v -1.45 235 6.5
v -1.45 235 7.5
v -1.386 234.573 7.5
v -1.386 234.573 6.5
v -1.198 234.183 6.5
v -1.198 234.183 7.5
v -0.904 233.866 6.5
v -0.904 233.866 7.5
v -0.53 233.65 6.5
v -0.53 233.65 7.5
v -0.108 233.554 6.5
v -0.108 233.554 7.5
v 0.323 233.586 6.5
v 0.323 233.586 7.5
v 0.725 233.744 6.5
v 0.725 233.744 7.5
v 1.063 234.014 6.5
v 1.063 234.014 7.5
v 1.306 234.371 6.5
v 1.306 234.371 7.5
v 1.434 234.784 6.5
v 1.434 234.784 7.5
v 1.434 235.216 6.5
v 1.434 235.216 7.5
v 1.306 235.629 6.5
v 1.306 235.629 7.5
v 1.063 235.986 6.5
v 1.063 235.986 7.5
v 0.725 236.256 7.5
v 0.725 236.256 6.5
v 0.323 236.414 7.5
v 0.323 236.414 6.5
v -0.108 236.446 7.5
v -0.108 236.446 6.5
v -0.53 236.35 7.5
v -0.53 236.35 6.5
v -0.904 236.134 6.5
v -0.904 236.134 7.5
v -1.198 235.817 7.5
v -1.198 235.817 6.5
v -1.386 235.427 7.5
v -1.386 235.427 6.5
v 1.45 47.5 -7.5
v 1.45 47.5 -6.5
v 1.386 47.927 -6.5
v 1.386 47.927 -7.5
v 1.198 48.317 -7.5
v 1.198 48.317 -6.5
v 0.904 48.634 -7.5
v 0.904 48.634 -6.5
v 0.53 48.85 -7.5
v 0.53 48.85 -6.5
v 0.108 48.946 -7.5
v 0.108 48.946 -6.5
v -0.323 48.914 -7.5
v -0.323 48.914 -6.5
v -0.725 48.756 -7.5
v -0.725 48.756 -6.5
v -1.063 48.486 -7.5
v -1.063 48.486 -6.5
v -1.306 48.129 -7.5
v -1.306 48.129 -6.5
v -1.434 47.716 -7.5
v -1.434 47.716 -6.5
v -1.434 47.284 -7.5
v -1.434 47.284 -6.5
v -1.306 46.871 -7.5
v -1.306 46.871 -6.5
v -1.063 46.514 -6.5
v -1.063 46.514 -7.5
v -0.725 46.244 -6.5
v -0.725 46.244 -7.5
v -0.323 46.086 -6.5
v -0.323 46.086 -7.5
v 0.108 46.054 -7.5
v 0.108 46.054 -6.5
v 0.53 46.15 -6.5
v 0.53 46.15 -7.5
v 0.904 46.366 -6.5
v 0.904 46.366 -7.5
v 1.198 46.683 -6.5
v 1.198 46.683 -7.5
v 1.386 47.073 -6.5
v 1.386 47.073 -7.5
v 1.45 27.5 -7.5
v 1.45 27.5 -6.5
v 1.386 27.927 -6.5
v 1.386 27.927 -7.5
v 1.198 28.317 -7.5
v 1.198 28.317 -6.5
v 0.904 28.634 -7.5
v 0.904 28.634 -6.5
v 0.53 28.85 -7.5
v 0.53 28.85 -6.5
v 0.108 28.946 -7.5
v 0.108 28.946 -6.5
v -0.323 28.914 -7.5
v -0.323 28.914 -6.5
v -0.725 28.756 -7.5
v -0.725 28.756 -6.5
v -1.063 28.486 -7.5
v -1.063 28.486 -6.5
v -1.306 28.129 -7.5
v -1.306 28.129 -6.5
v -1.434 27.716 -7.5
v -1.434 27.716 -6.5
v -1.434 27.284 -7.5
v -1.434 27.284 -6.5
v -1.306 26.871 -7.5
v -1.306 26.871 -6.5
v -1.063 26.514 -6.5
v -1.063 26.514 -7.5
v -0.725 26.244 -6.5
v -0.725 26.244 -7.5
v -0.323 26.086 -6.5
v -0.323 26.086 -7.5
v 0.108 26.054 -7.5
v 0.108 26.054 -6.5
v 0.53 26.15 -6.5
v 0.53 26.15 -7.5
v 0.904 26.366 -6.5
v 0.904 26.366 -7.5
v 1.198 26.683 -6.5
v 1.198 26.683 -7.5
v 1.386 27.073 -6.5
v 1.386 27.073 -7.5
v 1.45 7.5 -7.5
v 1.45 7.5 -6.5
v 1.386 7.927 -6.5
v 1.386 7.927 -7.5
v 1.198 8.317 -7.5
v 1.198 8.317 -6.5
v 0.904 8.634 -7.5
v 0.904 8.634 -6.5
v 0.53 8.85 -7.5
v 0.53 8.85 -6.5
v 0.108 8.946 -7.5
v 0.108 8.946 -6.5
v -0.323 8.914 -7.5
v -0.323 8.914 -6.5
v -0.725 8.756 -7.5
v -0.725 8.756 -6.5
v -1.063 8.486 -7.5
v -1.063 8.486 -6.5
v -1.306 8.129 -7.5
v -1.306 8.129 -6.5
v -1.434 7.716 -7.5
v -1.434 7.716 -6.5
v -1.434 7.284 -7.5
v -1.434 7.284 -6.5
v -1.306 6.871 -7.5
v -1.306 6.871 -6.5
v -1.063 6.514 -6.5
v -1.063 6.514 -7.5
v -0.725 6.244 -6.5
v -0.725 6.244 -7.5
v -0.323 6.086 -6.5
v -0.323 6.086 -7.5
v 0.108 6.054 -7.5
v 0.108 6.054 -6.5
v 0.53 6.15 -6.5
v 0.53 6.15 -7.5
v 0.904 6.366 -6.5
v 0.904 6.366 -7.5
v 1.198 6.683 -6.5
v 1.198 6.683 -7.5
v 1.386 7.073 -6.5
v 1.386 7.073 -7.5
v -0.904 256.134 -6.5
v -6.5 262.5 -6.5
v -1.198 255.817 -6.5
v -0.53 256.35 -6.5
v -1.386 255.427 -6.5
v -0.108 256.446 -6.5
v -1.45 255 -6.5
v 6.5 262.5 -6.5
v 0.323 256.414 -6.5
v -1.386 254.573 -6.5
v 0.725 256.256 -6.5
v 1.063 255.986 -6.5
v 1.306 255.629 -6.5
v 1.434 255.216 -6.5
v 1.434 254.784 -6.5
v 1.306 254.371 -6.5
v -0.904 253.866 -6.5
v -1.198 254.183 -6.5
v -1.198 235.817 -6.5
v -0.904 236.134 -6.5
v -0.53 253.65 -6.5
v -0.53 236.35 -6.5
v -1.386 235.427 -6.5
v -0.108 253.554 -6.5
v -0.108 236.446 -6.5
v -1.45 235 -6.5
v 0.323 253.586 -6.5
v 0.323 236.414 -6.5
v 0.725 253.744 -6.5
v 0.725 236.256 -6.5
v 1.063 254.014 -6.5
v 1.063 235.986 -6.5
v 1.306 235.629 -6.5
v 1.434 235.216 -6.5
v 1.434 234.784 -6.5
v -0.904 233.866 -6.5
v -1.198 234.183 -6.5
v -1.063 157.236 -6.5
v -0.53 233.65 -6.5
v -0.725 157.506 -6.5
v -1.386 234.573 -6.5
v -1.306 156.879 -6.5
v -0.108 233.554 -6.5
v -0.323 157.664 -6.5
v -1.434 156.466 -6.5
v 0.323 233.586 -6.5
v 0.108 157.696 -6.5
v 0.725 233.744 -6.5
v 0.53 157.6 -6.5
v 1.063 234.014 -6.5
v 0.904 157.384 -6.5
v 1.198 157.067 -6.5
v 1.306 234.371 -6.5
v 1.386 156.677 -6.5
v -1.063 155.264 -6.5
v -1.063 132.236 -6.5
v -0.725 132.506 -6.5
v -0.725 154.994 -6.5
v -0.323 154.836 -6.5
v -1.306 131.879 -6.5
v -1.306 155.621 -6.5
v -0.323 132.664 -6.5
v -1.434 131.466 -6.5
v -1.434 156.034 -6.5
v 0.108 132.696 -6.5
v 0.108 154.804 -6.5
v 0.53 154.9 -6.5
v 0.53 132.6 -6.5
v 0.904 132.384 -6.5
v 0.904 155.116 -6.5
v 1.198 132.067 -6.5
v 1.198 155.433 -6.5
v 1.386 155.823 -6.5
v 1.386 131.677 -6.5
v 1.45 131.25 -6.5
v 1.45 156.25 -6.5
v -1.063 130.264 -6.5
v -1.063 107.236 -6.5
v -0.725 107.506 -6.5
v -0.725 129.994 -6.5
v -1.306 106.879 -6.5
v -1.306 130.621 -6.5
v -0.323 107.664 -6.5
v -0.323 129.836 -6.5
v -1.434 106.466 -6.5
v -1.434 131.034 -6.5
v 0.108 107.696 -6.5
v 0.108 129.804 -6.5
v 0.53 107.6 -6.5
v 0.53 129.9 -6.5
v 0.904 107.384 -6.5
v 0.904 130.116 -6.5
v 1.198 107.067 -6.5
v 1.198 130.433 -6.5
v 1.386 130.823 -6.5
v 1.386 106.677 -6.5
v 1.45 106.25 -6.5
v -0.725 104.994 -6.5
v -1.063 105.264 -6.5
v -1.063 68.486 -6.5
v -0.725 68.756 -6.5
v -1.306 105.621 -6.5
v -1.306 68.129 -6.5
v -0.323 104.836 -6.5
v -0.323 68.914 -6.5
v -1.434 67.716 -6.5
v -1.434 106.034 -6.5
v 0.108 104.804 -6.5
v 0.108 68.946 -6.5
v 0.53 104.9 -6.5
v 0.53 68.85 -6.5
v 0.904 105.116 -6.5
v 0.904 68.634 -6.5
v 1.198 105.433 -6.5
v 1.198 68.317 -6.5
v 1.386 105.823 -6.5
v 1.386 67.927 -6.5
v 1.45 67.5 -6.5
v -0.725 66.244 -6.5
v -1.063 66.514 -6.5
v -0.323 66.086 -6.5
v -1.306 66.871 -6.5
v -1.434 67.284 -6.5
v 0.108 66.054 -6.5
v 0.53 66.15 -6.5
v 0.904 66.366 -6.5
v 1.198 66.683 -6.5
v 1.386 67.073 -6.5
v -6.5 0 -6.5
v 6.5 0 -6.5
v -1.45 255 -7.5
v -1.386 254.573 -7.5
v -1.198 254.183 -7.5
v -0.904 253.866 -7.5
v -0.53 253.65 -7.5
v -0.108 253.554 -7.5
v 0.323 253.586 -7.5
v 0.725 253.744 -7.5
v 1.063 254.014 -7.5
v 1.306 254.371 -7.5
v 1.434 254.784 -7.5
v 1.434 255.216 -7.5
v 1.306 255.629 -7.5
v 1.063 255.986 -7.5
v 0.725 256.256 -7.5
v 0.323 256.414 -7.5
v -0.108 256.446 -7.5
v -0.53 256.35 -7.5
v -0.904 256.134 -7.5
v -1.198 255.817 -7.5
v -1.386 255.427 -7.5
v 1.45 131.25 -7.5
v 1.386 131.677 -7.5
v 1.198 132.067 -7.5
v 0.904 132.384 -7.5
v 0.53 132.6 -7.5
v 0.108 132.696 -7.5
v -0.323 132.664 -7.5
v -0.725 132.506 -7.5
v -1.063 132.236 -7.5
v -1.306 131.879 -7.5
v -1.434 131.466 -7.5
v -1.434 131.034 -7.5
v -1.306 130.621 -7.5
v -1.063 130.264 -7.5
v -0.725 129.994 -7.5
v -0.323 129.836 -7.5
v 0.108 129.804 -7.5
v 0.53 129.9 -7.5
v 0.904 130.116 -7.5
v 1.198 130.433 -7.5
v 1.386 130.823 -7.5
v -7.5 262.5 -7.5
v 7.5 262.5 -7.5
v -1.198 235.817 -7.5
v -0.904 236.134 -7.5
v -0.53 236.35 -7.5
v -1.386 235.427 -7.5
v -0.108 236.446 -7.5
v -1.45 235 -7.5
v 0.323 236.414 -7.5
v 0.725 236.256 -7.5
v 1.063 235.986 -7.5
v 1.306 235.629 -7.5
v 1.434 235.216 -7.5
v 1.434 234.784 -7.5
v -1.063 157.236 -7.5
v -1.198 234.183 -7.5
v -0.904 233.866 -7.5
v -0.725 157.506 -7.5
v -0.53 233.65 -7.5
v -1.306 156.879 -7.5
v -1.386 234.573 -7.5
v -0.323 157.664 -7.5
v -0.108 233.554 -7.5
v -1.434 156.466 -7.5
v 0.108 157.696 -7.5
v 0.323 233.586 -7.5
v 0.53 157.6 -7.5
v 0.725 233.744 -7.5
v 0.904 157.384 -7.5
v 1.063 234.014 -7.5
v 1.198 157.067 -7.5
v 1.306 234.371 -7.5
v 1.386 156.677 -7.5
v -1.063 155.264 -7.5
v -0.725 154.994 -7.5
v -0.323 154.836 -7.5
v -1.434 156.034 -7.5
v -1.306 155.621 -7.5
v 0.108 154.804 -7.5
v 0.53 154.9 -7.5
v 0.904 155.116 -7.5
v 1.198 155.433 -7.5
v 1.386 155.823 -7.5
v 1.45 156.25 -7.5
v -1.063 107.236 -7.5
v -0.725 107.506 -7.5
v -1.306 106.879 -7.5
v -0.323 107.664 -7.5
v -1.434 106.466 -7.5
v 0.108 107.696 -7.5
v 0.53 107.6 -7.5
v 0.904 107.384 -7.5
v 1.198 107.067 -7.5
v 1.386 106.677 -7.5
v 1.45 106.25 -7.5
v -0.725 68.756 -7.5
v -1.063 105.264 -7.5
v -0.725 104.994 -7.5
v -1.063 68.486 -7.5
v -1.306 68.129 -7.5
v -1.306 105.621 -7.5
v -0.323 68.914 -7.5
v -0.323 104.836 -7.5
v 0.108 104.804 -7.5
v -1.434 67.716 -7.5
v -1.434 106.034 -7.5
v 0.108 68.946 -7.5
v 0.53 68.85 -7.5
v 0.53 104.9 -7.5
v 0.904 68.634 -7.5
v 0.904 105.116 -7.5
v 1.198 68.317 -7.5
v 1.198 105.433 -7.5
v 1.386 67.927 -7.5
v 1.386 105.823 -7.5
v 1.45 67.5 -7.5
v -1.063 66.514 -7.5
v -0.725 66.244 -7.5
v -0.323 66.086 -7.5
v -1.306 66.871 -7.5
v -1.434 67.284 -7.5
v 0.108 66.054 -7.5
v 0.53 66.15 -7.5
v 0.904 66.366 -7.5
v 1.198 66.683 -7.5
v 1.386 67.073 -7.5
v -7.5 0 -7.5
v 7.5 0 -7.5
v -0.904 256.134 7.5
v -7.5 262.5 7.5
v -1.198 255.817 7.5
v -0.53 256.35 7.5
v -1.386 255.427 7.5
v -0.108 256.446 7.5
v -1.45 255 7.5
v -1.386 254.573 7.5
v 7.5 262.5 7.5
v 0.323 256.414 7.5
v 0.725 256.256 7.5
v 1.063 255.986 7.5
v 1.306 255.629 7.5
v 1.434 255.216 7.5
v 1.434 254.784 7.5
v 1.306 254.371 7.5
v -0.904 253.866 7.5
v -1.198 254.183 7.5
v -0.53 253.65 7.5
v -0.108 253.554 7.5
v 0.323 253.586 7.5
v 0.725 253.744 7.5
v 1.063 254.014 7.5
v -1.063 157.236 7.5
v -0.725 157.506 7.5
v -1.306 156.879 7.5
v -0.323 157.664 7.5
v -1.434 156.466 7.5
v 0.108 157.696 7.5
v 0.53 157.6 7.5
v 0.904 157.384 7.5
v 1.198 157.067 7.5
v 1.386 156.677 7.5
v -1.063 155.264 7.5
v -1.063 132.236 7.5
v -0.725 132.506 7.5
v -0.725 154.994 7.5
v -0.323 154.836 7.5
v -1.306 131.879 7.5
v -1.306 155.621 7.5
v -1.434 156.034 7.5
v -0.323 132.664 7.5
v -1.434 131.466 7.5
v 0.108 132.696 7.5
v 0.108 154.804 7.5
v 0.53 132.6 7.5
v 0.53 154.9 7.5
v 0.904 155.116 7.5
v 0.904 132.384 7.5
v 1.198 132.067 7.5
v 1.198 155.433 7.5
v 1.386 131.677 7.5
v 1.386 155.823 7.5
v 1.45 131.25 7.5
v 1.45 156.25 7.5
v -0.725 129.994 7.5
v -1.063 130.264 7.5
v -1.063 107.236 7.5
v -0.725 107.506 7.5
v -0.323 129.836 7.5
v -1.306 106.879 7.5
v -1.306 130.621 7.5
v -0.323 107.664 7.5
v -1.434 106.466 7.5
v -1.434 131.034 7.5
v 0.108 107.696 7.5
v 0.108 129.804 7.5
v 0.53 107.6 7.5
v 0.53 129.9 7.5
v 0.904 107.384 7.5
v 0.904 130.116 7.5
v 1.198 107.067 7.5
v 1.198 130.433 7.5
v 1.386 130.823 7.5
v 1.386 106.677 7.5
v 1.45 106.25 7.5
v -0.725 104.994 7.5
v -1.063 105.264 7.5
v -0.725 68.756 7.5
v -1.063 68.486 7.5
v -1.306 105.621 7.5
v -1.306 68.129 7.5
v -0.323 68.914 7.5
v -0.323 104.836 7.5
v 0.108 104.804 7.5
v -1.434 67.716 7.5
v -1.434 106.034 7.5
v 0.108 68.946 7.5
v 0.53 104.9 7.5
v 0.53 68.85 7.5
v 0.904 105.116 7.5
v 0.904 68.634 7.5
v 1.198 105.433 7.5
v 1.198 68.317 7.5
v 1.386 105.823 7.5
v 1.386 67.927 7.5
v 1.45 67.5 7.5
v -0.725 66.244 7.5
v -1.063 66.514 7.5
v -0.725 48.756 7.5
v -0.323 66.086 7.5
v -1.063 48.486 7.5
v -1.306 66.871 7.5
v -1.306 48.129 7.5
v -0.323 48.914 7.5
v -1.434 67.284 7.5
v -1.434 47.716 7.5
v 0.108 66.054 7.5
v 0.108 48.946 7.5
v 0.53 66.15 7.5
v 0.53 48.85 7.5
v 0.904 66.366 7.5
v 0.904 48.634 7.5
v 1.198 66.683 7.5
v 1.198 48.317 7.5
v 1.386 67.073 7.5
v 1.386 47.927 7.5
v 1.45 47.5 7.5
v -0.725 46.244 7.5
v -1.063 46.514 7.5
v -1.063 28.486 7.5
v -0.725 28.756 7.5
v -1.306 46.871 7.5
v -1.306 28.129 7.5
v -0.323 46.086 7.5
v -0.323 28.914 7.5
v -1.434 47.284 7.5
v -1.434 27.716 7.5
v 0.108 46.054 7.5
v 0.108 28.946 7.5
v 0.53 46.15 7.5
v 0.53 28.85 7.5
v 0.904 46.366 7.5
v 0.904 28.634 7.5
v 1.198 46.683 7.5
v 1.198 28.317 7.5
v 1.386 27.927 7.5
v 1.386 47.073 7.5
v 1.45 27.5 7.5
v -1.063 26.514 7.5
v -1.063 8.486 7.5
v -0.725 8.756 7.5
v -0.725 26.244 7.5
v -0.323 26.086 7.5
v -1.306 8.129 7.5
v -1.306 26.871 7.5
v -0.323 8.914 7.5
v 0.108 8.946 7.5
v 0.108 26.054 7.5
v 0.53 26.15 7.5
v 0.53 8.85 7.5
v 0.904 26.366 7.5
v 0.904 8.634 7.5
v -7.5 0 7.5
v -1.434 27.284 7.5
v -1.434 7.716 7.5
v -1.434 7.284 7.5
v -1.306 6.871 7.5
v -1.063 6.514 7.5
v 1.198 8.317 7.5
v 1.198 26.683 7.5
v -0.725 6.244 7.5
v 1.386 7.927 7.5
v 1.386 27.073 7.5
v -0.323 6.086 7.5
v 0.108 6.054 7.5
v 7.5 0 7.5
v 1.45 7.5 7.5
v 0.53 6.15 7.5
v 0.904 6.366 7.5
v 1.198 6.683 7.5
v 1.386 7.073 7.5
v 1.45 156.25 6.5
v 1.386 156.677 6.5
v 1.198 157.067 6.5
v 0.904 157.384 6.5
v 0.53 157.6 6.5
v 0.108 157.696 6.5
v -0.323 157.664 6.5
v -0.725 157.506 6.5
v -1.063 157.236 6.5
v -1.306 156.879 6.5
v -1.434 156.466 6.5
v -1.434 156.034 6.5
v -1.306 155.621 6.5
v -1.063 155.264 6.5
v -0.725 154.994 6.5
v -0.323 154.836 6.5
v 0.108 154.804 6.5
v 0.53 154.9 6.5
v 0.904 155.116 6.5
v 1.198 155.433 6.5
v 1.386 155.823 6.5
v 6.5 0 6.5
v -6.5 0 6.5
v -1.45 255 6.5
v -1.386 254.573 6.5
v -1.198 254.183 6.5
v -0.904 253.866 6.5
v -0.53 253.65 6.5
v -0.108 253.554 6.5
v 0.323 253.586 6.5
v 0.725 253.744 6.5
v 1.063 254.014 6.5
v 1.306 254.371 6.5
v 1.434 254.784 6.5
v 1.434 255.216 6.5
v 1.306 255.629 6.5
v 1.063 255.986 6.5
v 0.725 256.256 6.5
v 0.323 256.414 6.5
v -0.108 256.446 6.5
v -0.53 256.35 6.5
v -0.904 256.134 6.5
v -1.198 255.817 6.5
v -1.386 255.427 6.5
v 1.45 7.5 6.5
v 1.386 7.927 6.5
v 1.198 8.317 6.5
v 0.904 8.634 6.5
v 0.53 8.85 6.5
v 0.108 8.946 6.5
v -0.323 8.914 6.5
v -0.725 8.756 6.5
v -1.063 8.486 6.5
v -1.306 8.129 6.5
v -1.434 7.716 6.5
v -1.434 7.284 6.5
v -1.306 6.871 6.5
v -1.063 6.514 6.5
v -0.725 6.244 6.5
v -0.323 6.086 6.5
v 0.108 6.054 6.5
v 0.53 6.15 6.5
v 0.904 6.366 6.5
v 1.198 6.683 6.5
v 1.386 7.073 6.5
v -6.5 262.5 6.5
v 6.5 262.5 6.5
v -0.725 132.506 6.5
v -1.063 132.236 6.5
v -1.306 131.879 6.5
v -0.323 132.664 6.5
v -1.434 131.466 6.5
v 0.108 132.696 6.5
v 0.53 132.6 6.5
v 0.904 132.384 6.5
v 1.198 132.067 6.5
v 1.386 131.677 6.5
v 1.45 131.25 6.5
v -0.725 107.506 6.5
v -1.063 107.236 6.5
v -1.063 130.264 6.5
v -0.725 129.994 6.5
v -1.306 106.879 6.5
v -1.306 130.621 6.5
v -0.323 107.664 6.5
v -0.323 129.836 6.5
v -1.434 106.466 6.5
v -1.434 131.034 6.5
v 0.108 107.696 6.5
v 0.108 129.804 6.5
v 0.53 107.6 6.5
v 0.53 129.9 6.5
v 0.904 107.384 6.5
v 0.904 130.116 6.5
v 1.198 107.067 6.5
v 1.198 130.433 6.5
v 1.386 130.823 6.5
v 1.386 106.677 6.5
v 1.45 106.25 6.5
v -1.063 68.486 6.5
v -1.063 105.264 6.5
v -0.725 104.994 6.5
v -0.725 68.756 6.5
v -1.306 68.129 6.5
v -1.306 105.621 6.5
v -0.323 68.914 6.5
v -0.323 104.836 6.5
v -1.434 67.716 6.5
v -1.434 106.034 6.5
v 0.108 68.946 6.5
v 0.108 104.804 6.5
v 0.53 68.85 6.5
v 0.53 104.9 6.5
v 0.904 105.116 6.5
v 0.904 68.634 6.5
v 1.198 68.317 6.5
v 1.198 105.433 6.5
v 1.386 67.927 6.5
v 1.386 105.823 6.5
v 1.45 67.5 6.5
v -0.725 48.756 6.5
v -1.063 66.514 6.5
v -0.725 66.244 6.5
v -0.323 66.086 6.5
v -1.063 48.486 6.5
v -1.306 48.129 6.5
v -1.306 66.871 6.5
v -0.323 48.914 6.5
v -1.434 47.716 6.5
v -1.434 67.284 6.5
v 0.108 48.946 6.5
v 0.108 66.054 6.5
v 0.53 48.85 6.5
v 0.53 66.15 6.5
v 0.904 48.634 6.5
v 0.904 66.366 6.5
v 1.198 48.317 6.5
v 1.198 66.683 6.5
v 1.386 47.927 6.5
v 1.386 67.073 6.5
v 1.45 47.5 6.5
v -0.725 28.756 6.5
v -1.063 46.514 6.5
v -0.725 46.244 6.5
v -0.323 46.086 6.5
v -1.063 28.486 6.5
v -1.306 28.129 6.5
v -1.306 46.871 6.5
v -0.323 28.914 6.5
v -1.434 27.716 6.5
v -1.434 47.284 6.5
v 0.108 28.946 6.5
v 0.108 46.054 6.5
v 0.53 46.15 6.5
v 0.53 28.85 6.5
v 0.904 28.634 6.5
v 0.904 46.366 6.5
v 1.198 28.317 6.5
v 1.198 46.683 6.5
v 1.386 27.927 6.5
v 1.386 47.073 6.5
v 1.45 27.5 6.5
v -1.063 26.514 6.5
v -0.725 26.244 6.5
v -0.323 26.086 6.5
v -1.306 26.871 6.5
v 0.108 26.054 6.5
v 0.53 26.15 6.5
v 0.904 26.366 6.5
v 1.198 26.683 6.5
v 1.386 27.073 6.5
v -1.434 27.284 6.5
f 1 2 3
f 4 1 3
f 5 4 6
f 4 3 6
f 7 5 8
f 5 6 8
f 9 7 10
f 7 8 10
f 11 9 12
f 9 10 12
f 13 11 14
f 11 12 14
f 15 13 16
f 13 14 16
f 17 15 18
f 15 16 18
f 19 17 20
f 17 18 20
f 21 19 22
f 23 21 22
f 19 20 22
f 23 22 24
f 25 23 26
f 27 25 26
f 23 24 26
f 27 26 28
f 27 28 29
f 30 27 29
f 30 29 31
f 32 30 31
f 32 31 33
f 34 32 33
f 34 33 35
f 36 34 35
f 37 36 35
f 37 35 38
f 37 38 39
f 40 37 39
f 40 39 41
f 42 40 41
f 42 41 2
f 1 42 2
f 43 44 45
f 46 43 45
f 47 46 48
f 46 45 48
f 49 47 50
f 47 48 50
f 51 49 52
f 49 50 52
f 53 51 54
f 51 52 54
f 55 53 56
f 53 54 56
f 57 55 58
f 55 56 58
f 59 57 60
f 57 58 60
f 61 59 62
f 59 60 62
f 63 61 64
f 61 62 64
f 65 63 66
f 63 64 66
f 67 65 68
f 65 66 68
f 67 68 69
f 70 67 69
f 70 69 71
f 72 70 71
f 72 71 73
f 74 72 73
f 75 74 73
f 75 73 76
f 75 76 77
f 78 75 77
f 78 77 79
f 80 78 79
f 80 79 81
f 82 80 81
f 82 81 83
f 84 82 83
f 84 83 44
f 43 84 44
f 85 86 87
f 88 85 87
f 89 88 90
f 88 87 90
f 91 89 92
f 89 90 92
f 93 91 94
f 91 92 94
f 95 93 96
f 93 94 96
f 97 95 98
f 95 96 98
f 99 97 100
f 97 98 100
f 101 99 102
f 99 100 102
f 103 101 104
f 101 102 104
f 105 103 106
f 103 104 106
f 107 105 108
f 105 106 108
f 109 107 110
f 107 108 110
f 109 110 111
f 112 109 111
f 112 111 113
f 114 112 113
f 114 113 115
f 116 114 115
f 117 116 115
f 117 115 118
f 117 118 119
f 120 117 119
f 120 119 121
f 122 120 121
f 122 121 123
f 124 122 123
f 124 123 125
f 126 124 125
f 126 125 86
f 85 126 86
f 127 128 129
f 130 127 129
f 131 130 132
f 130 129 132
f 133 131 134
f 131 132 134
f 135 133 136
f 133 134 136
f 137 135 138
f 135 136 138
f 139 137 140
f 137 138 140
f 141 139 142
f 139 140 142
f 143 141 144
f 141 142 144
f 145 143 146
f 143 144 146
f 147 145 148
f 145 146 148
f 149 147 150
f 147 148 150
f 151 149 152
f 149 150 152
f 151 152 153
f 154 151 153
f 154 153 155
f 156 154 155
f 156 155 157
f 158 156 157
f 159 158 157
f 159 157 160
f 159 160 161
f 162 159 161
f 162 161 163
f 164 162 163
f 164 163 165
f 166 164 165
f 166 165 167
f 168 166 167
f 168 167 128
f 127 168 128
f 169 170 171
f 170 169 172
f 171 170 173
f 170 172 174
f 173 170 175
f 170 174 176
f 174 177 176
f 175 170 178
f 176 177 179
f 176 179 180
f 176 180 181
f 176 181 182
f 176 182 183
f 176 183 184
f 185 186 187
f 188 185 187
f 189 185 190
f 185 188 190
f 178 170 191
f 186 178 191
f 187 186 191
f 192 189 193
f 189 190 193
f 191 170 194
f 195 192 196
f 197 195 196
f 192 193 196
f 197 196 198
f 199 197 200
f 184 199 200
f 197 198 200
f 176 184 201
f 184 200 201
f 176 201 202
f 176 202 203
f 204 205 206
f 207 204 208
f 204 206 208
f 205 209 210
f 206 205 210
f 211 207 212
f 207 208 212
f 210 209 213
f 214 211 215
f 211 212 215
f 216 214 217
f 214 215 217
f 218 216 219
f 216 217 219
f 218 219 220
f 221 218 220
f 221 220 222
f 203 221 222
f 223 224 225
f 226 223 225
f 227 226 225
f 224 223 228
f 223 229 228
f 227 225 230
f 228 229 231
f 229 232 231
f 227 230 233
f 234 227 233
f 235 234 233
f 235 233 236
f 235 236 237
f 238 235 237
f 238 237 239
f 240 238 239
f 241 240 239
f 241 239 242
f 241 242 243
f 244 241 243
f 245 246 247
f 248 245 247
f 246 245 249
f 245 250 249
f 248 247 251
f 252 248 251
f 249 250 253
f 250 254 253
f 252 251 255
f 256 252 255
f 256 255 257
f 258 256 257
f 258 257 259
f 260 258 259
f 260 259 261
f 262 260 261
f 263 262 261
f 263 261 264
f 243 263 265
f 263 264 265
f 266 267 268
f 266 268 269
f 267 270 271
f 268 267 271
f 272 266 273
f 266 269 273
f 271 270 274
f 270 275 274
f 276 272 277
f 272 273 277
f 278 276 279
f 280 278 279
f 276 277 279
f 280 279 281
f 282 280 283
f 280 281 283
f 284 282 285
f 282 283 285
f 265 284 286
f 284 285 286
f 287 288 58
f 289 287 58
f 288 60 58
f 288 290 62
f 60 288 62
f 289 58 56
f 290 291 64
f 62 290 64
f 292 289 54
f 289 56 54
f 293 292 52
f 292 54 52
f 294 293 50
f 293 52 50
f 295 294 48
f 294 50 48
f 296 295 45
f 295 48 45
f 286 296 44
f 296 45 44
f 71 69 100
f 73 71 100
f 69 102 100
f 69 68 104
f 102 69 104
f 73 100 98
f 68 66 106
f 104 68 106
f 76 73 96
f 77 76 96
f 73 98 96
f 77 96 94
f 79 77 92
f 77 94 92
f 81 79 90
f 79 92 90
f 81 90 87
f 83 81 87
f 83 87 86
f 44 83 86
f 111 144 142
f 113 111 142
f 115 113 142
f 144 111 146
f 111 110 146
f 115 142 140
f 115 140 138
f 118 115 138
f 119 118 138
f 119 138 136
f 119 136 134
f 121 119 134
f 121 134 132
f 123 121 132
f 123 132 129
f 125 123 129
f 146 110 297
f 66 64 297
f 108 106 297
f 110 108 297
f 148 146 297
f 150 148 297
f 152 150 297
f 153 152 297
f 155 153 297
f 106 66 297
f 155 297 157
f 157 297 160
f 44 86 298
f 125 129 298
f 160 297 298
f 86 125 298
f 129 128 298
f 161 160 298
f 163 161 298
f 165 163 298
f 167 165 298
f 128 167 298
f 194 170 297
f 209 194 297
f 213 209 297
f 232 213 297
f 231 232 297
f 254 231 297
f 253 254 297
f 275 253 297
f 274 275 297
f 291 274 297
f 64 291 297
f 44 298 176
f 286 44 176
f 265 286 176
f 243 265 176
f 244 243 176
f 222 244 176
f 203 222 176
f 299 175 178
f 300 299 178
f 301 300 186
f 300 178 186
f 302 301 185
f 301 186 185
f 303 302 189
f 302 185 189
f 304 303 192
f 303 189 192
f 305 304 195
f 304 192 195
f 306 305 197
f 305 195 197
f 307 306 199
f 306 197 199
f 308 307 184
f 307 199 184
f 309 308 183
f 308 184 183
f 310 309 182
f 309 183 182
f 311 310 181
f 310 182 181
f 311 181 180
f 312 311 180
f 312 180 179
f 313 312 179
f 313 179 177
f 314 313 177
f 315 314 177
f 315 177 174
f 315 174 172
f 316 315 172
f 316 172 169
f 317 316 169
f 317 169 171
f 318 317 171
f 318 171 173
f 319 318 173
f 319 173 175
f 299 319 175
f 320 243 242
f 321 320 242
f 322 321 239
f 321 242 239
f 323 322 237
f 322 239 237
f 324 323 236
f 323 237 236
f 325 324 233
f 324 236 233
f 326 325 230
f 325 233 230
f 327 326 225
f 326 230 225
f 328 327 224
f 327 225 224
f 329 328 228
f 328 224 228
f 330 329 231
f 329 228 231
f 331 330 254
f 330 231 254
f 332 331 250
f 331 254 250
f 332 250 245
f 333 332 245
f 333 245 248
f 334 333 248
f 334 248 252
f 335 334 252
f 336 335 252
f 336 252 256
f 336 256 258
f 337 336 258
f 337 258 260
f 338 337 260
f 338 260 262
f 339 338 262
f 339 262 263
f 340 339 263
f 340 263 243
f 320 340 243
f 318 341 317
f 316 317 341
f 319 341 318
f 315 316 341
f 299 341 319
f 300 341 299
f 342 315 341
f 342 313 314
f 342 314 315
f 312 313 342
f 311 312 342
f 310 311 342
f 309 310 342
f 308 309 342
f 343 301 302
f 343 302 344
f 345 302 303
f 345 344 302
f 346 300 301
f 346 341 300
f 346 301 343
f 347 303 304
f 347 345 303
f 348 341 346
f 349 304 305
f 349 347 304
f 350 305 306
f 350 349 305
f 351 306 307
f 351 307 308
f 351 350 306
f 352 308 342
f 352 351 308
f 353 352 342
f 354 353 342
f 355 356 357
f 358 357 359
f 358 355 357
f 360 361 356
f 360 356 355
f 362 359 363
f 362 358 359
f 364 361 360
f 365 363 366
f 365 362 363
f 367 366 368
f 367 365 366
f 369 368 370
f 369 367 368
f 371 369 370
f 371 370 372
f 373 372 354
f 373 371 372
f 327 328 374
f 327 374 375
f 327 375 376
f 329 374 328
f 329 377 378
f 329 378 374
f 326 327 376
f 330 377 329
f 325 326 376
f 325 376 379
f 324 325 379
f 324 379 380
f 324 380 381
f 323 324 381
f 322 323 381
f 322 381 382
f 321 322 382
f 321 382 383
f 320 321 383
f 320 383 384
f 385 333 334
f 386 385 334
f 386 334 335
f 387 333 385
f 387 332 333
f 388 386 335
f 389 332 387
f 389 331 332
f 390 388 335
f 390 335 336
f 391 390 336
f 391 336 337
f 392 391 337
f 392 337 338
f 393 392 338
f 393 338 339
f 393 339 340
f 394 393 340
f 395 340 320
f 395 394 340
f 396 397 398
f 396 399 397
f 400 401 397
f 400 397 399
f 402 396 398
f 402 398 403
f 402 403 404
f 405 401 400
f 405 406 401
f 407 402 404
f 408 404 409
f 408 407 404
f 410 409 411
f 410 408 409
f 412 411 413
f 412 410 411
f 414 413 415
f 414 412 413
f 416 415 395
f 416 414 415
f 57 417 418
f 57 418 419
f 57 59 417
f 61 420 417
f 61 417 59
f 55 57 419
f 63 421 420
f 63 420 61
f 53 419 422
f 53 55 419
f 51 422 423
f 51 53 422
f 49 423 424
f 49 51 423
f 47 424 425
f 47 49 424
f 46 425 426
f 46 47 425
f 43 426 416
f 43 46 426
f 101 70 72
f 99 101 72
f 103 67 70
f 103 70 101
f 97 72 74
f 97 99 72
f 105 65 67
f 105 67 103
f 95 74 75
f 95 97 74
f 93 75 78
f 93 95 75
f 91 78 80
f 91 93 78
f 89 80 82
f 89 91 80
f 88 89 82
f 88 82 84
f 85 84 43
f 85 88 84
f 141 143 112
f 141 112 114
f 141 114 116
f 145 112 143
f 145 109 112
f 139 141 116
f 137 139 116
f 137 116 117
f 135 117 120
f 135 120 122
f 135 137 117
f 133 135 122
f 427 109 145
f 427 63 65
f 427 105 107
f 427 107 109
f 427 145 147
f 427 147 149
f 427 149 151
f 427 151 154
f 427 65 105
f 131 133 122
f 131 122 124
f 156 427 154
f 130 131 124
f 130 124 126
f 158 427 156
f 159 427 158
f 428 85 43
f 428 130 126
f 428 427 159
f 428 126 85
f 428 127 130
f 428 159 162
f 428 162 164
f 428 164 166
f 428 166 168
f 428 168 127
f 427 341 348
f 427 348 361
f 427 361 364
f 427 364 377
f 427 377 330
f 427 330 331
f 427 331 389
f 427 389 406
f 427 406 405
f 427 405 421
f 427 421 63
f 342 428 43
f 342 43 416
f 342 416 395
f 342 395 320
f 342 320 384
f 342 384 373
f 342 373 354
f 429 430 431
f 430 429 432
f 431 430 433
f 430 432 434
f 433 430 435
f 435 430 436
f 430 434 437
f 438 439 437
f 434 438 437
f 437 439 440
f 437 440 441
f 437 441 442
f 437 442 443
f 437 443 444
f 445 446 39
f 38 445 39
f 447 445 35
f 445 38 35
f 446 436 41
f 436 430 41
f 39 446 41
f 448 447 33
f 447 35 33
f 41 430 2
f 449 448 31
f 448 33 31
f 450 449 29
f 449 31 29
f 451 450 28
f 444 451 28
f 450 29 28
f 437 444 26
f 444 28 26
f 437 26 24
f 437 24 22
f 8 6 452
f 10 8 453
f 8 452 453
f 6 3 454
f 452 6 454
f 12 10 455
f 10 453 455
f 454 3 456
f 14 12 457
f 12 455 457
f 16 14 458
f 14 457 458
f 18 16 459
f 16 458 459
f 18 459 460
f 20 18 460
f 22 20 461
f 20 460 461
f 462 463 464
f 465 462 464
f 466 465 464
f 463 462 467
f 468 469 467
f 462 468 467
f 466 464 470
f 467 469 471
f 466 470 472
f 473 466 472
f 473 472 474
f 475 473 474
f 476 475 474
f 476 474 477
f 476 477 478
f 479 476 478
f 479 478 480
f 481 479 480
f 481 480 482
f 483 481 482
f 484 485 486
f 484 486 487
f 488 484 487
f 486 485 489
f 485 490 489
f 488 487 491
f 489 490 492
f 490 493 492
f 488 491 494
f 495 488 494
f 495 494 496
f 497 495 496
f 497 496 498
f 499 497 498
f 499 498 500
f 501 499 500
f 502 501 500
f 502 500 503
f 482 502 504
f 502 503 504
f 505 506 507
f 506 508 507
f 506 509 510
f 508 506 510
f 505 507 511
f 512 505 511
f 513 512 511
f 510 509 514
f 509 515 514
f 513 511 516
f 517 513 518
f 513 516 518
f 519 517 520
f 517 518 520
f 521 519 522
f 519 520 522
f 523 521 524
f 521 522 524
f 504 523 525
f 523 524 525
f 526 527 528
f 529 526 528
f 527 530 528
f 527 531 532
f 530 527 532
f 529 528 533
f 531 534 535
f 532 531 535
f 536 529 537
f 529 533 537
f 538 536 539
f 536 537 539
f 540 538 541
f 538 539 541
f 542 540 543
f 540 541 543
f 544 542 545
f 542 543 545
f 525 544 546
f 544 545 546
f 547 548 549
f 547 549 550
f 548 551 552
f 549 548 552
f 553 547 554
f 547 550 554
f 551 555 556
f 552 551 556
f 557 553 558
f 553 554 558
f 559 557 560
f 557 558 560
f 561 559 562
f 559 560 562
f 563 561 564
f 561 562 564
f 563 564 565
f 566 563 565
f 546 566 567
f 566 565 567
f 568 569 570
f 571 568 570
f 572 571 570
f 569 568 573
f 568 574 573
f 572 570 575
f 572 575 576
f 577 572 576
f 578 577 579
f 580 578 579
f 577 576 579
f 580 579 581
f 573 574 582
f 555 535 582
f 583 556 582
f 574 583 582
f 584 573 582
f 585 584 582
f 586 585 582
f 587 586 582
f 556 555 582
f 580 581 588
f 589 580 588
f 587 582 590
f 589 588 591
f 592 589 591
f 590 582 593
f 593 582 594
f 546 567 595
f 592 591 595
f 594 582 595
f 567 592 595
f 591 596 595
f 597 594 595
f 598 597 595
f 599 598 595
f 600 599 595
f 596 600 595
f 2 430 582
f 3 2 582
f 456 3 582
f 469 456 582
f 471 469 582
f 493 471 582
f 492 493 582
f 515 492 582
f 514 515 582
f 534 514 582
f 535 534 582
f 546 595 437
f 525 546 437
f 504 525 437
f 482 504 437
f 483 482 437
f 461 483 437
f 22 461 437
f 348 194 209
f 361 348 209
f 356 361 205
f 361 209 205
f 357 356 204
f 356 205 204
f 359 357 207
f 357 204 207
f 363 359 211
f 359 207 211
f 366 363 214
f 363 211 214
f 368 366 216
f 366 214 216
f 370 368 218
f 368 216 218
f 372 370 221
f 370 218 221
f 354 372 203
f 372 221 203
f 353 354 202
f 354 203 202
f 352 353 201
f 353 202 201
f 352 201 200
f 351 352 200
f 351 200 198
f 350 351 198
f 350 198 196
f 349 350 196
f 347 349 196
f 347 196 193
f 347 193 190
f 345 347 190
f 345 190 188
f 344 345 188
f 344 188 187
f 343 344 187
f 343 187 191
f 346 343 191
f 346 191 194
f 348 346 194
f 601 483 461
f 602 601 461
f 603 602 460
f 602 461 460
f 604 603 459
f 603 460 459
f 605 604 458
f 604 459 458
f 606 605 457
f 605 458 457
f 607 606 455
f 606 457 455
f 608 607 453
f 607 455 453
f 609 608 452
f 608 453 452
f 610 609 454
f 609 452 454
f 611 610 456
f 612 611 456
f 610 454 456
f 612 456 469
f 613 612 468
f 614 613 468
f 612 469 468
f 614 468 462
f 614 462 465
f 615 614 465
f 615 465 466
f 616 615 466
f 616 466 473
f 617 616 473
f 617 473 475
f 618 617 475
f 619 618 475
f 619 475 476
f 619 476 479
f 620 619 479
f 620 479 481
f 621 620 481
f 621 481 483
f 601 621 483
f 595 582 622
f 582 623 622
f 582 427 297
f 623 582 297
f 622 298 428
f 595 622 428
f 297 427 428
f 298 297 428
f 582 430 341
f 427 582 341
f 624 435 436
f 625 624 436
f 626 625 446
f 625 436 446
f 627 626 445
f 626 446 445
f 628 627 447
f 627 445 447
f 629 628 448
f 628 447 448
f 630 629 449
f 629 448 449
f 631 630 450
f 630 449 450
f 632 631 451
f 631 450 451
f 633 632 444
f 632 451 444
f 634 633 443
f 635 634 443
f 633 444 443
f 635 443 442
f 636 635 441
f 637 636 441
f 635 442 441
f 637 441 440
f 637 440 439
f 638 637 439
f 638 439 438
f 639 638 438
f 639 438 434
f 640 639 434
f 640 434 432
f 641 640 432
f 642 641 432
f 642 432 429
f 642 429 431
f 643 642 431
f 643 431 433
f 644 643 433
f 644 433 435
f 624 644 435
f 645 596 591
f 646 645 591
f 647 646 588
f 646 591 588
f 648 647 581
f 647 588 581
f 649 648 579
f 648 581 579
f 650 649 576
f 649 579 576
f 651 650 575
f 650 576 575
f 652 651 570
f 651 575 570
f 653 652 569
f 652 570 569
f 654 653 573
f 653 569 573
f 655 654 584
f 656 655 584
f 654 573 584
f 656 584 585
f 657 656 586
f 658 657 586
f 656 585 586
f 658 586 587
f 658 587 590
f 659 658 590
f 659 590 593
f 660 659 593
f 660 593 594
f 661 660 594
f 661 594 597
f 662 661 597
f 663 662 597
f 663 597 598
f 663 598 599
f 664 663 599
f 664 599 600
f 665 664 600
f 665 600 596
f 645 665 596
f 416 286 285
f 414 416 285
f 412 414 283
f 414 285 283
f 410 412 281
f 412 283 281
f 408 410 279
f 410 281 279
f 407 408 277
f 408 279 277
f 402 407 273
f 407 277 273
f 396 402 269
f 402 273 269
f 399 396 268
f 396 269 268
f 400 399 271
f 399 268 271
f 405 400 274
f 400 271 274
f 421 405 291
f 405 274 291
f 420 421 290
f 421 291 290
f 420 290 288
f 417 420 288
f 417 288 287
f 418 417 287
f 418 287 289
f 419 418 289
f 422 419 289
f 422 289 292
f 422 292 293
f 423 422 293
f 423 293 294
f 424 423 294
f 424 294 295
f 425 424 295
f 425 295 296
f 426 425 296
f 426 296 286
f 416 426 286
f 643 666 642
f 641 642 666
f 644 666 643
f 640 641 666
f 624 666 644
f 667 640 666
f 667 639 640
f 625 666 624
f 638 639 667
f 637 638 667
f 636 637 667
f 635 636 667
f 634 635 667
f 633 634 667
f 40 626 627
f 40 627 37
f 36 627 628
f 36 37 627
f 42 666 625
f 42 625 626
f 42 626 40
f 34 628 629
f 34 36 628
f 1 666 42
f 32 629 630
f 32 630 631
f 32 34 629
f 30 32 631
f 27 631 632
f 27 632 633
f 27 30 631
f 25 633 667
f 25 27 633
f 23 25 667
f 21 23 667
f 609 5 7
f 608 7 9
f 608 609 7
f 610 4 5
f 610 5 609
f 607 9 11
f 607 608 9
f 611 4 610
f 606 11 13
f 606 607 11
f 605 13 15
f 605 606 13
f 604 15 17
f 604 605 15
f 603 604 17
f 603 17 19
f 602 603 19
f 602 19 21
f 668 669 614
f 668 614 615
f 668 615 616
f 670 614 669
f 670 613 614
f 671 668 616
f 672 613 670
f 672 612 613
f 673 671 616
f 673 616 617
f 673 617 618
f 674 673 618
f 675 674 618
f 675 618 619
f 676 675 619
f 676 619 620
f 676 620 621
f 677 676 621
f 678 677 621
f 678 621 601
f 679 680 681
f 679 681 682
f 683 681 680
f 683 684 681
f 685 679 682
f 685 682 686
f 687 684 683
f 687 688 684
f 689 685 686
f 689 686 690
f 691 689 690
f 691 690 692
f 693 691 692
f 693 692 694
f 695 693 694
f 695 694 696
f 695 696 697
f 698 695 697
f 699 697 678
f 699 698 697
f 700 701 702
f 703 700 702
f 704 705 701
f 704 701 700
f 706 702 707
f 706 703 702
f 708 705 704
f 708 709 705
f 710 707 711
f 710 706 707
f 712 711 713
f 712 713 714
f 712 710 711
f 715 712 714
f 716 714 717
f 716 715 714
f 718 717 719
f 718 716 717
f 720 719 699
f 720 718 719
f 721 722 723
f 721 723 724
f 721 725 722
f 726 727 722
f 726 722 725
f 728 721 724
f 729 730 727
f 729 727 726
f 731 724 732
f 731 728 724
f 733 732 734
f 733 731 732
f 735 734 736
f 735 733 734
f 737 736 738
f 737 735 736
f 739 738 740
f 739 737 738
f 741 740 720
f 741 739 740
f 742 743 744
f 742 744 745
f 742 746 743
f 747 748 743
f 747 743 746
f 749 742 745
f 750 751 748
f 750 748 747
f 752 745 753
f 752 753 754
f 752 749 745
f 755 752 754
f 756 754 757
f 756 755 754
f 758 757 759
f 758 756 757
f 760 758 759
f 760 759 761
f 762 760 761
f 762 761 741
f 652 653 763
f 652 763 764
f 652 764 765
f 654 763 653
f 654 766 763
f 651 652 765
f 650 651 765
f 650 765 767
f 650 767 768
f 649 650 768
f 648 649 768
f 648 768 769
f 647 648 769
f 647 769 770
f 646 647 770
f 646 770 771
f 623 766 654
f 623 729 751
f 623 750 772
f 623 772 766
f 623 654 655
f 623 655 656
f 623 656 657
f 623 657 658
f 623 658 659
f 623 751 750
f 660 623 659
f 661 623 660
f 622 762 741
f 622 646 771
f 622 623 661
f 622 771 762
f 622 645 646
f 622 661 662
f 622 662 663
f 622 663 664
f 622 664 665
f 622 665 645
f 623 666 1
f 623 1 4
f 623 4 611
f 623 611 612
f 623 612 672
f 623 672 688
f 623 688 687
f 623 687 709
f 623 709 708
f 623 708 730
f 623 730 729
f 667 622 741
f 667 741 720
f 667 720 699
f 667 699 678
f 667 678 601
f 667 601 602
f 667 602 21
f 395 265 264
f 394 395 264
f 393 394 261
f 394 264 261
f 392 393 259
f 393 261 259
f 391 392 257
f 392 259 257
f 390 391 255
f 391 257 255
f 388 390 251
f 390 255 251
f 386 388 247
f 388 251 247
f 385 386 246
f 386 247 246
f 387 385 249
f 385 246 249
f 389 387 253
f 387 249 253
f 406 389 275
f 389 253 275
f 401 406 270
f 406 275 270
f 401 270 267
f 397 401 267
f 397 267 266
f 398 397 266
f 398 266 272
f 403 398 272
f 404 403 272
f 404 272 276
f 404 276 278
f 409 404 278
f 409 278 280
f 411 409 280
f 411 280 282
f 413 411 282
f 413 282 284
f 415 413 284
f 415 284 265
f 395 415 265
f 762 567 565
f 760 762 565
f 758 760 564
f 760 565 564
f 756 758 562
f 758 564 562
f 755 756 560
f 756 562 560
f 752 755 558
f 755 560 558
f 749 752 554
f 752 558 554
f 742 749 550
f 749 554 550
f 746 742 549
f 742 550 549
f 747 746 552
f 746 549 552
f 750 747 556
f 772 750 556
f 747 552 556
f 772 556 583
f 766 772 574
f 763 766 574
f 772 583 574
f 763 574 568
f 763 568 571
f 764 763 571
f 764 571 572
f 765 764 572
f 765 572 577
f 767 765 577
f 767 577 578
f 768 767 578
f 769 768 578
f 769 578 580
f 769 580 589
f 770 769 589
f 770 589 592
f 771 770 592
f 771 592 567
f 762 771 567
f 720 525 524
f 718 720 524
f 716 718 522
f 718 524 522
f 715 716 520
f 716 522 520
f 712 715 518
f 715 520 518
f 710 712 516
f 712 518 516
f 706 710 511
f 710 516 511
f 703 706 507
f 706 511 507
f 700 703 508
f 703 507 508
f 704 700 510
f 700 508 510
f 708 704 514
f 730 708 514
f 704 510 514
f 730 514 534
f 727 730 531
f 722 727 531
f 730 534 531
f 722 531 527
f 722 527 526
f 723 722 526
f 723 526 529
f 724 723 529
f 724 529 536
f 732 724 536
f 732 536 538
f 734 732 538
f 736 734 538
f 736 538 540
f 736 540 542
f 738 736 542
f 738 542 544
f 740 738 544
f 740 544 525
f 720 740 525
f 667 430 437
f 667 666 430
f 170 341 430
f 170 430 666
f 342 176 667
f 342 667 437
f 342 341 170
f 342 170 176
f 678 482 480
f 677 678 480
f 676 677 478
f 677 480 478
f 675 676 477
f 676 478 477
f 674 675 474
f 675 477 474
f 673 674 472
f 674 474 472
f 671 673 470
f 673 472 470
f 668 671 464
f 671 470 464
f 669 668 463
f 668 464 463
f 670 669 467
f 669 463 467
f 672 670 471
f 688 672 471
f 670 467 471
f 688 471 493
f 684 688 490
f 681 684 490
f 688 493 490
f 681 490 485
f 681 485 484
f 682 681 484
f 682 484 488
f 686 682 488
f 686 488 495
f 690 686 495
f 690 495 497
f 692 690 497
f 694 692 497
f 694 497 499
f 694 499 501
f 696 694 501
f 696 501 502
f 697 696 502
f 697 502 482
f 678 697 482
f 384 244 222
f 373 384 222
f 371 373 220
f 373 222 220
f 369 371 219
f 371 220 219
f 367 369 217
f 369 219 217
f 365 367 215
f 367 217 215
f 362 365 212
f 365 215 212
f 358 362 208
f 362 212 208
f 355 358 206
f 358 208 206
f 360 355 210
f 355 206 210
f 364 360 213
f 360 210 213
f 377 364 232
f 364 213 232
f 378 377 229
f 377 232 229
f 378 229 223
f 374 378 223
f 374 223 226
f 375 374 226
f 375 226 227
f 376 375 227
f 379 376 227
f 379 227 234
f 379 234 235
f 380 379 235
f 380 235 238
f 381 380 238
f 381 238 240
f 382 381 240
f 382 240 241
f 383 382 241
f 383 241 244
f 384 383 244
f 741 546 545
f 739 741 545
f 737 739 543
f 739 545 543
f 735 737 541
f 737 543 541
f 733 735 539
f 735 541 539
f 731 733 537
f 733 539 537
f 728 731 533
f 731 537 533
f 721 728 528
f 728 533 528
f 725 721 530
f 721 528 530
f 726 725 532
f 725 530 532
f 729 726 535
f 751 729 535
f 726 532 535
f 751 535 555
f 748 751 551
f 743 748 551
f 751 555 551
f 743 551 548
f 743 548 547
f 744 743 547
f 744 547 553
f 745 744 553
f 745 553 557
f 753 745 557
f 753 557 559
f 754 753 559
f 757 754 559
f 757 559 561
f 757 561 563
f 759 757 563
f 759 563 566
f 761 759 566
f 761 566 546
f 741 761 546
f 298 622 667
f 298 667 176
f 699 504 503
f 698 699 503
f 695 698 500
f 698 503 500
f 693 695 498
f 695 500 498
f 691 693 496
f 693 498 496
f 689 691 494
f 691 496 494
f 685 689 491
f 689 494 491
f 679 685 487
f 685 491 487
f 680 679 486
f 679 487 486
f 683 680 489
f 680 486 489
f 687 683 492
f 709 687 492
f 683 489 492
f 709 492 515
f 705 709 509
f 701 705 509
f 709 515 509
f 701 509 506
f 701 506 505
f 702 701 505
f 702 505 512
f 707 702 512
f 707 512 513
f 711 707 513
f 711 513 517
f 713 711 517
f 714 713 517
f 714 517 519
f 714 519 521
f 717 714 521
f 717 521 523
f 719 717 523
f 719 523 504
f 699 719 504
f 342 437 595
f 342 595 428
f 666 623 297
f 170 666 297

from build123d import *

# Parameters (mm, degrees)
SKETCH_1_W          = 15
SKETCH_1_H          = 15
SKETCH_1_W_2        = 13
SKETCH_1_H_2        = 13
EXTRUDE_1_DEPTH     = 262.5
SKETCH_2_R          = 1.45
CUT_EXTRUDE_1_DEPTH = 264.035168751


with BuildPart() as part:
    # 草图1 → 拉伸-薄壁1 (new body)
    with BuildSketch(Plane(origin=(0, 0, 0), x_dir=(1, 0, 0), z_dir=(0, 1, 0))):
        Rectangle(SKETCH_1_W, SKETCH_1_H)
        Rectangle(SKETCH_1_W_2, SKETCH_1_H_2, mode=Mode.SUBTRACT)
    extrude(amount=EXTRUDE_1_DEPTH)

    # 草图2 → 切除-拉伸1 (cut, through all)
    with BuildSketch(Plane.XY.offset(7.5)):
        with Locations((0, 7.5)):
            Circle(SKETCH_2_R)
        with Locations((0, 27.5)):
            Circle(SKETCH_2_R)
        with Locations(Location((0, 235, 0), (0, 0, 180))):
            Circle(SKETCH_2_R)
        with Locations(Location((0, 255, 0), (0, 0, 180))):
            Circle(SKETCH_2_R)
        with Locations((0, 131.25)):
            Circle(SKETCH_2_R)
        with Locations((0, 106.25)):
            Circle(SKETCH_2_R)
        with Locations((0, 156.25)):
            Circle(SKETCH_2_R)
        with Locations((0, 47.5)):
            Circle(SKETCH_2_R)
        with Locations((0, 67.5)):
            Circle(SKETCH_2_R)
    extrude(amount=-CUT_EXTRUDE_1_DEPTH, mode=Mode.SUBTRACT)


solid = part.part
